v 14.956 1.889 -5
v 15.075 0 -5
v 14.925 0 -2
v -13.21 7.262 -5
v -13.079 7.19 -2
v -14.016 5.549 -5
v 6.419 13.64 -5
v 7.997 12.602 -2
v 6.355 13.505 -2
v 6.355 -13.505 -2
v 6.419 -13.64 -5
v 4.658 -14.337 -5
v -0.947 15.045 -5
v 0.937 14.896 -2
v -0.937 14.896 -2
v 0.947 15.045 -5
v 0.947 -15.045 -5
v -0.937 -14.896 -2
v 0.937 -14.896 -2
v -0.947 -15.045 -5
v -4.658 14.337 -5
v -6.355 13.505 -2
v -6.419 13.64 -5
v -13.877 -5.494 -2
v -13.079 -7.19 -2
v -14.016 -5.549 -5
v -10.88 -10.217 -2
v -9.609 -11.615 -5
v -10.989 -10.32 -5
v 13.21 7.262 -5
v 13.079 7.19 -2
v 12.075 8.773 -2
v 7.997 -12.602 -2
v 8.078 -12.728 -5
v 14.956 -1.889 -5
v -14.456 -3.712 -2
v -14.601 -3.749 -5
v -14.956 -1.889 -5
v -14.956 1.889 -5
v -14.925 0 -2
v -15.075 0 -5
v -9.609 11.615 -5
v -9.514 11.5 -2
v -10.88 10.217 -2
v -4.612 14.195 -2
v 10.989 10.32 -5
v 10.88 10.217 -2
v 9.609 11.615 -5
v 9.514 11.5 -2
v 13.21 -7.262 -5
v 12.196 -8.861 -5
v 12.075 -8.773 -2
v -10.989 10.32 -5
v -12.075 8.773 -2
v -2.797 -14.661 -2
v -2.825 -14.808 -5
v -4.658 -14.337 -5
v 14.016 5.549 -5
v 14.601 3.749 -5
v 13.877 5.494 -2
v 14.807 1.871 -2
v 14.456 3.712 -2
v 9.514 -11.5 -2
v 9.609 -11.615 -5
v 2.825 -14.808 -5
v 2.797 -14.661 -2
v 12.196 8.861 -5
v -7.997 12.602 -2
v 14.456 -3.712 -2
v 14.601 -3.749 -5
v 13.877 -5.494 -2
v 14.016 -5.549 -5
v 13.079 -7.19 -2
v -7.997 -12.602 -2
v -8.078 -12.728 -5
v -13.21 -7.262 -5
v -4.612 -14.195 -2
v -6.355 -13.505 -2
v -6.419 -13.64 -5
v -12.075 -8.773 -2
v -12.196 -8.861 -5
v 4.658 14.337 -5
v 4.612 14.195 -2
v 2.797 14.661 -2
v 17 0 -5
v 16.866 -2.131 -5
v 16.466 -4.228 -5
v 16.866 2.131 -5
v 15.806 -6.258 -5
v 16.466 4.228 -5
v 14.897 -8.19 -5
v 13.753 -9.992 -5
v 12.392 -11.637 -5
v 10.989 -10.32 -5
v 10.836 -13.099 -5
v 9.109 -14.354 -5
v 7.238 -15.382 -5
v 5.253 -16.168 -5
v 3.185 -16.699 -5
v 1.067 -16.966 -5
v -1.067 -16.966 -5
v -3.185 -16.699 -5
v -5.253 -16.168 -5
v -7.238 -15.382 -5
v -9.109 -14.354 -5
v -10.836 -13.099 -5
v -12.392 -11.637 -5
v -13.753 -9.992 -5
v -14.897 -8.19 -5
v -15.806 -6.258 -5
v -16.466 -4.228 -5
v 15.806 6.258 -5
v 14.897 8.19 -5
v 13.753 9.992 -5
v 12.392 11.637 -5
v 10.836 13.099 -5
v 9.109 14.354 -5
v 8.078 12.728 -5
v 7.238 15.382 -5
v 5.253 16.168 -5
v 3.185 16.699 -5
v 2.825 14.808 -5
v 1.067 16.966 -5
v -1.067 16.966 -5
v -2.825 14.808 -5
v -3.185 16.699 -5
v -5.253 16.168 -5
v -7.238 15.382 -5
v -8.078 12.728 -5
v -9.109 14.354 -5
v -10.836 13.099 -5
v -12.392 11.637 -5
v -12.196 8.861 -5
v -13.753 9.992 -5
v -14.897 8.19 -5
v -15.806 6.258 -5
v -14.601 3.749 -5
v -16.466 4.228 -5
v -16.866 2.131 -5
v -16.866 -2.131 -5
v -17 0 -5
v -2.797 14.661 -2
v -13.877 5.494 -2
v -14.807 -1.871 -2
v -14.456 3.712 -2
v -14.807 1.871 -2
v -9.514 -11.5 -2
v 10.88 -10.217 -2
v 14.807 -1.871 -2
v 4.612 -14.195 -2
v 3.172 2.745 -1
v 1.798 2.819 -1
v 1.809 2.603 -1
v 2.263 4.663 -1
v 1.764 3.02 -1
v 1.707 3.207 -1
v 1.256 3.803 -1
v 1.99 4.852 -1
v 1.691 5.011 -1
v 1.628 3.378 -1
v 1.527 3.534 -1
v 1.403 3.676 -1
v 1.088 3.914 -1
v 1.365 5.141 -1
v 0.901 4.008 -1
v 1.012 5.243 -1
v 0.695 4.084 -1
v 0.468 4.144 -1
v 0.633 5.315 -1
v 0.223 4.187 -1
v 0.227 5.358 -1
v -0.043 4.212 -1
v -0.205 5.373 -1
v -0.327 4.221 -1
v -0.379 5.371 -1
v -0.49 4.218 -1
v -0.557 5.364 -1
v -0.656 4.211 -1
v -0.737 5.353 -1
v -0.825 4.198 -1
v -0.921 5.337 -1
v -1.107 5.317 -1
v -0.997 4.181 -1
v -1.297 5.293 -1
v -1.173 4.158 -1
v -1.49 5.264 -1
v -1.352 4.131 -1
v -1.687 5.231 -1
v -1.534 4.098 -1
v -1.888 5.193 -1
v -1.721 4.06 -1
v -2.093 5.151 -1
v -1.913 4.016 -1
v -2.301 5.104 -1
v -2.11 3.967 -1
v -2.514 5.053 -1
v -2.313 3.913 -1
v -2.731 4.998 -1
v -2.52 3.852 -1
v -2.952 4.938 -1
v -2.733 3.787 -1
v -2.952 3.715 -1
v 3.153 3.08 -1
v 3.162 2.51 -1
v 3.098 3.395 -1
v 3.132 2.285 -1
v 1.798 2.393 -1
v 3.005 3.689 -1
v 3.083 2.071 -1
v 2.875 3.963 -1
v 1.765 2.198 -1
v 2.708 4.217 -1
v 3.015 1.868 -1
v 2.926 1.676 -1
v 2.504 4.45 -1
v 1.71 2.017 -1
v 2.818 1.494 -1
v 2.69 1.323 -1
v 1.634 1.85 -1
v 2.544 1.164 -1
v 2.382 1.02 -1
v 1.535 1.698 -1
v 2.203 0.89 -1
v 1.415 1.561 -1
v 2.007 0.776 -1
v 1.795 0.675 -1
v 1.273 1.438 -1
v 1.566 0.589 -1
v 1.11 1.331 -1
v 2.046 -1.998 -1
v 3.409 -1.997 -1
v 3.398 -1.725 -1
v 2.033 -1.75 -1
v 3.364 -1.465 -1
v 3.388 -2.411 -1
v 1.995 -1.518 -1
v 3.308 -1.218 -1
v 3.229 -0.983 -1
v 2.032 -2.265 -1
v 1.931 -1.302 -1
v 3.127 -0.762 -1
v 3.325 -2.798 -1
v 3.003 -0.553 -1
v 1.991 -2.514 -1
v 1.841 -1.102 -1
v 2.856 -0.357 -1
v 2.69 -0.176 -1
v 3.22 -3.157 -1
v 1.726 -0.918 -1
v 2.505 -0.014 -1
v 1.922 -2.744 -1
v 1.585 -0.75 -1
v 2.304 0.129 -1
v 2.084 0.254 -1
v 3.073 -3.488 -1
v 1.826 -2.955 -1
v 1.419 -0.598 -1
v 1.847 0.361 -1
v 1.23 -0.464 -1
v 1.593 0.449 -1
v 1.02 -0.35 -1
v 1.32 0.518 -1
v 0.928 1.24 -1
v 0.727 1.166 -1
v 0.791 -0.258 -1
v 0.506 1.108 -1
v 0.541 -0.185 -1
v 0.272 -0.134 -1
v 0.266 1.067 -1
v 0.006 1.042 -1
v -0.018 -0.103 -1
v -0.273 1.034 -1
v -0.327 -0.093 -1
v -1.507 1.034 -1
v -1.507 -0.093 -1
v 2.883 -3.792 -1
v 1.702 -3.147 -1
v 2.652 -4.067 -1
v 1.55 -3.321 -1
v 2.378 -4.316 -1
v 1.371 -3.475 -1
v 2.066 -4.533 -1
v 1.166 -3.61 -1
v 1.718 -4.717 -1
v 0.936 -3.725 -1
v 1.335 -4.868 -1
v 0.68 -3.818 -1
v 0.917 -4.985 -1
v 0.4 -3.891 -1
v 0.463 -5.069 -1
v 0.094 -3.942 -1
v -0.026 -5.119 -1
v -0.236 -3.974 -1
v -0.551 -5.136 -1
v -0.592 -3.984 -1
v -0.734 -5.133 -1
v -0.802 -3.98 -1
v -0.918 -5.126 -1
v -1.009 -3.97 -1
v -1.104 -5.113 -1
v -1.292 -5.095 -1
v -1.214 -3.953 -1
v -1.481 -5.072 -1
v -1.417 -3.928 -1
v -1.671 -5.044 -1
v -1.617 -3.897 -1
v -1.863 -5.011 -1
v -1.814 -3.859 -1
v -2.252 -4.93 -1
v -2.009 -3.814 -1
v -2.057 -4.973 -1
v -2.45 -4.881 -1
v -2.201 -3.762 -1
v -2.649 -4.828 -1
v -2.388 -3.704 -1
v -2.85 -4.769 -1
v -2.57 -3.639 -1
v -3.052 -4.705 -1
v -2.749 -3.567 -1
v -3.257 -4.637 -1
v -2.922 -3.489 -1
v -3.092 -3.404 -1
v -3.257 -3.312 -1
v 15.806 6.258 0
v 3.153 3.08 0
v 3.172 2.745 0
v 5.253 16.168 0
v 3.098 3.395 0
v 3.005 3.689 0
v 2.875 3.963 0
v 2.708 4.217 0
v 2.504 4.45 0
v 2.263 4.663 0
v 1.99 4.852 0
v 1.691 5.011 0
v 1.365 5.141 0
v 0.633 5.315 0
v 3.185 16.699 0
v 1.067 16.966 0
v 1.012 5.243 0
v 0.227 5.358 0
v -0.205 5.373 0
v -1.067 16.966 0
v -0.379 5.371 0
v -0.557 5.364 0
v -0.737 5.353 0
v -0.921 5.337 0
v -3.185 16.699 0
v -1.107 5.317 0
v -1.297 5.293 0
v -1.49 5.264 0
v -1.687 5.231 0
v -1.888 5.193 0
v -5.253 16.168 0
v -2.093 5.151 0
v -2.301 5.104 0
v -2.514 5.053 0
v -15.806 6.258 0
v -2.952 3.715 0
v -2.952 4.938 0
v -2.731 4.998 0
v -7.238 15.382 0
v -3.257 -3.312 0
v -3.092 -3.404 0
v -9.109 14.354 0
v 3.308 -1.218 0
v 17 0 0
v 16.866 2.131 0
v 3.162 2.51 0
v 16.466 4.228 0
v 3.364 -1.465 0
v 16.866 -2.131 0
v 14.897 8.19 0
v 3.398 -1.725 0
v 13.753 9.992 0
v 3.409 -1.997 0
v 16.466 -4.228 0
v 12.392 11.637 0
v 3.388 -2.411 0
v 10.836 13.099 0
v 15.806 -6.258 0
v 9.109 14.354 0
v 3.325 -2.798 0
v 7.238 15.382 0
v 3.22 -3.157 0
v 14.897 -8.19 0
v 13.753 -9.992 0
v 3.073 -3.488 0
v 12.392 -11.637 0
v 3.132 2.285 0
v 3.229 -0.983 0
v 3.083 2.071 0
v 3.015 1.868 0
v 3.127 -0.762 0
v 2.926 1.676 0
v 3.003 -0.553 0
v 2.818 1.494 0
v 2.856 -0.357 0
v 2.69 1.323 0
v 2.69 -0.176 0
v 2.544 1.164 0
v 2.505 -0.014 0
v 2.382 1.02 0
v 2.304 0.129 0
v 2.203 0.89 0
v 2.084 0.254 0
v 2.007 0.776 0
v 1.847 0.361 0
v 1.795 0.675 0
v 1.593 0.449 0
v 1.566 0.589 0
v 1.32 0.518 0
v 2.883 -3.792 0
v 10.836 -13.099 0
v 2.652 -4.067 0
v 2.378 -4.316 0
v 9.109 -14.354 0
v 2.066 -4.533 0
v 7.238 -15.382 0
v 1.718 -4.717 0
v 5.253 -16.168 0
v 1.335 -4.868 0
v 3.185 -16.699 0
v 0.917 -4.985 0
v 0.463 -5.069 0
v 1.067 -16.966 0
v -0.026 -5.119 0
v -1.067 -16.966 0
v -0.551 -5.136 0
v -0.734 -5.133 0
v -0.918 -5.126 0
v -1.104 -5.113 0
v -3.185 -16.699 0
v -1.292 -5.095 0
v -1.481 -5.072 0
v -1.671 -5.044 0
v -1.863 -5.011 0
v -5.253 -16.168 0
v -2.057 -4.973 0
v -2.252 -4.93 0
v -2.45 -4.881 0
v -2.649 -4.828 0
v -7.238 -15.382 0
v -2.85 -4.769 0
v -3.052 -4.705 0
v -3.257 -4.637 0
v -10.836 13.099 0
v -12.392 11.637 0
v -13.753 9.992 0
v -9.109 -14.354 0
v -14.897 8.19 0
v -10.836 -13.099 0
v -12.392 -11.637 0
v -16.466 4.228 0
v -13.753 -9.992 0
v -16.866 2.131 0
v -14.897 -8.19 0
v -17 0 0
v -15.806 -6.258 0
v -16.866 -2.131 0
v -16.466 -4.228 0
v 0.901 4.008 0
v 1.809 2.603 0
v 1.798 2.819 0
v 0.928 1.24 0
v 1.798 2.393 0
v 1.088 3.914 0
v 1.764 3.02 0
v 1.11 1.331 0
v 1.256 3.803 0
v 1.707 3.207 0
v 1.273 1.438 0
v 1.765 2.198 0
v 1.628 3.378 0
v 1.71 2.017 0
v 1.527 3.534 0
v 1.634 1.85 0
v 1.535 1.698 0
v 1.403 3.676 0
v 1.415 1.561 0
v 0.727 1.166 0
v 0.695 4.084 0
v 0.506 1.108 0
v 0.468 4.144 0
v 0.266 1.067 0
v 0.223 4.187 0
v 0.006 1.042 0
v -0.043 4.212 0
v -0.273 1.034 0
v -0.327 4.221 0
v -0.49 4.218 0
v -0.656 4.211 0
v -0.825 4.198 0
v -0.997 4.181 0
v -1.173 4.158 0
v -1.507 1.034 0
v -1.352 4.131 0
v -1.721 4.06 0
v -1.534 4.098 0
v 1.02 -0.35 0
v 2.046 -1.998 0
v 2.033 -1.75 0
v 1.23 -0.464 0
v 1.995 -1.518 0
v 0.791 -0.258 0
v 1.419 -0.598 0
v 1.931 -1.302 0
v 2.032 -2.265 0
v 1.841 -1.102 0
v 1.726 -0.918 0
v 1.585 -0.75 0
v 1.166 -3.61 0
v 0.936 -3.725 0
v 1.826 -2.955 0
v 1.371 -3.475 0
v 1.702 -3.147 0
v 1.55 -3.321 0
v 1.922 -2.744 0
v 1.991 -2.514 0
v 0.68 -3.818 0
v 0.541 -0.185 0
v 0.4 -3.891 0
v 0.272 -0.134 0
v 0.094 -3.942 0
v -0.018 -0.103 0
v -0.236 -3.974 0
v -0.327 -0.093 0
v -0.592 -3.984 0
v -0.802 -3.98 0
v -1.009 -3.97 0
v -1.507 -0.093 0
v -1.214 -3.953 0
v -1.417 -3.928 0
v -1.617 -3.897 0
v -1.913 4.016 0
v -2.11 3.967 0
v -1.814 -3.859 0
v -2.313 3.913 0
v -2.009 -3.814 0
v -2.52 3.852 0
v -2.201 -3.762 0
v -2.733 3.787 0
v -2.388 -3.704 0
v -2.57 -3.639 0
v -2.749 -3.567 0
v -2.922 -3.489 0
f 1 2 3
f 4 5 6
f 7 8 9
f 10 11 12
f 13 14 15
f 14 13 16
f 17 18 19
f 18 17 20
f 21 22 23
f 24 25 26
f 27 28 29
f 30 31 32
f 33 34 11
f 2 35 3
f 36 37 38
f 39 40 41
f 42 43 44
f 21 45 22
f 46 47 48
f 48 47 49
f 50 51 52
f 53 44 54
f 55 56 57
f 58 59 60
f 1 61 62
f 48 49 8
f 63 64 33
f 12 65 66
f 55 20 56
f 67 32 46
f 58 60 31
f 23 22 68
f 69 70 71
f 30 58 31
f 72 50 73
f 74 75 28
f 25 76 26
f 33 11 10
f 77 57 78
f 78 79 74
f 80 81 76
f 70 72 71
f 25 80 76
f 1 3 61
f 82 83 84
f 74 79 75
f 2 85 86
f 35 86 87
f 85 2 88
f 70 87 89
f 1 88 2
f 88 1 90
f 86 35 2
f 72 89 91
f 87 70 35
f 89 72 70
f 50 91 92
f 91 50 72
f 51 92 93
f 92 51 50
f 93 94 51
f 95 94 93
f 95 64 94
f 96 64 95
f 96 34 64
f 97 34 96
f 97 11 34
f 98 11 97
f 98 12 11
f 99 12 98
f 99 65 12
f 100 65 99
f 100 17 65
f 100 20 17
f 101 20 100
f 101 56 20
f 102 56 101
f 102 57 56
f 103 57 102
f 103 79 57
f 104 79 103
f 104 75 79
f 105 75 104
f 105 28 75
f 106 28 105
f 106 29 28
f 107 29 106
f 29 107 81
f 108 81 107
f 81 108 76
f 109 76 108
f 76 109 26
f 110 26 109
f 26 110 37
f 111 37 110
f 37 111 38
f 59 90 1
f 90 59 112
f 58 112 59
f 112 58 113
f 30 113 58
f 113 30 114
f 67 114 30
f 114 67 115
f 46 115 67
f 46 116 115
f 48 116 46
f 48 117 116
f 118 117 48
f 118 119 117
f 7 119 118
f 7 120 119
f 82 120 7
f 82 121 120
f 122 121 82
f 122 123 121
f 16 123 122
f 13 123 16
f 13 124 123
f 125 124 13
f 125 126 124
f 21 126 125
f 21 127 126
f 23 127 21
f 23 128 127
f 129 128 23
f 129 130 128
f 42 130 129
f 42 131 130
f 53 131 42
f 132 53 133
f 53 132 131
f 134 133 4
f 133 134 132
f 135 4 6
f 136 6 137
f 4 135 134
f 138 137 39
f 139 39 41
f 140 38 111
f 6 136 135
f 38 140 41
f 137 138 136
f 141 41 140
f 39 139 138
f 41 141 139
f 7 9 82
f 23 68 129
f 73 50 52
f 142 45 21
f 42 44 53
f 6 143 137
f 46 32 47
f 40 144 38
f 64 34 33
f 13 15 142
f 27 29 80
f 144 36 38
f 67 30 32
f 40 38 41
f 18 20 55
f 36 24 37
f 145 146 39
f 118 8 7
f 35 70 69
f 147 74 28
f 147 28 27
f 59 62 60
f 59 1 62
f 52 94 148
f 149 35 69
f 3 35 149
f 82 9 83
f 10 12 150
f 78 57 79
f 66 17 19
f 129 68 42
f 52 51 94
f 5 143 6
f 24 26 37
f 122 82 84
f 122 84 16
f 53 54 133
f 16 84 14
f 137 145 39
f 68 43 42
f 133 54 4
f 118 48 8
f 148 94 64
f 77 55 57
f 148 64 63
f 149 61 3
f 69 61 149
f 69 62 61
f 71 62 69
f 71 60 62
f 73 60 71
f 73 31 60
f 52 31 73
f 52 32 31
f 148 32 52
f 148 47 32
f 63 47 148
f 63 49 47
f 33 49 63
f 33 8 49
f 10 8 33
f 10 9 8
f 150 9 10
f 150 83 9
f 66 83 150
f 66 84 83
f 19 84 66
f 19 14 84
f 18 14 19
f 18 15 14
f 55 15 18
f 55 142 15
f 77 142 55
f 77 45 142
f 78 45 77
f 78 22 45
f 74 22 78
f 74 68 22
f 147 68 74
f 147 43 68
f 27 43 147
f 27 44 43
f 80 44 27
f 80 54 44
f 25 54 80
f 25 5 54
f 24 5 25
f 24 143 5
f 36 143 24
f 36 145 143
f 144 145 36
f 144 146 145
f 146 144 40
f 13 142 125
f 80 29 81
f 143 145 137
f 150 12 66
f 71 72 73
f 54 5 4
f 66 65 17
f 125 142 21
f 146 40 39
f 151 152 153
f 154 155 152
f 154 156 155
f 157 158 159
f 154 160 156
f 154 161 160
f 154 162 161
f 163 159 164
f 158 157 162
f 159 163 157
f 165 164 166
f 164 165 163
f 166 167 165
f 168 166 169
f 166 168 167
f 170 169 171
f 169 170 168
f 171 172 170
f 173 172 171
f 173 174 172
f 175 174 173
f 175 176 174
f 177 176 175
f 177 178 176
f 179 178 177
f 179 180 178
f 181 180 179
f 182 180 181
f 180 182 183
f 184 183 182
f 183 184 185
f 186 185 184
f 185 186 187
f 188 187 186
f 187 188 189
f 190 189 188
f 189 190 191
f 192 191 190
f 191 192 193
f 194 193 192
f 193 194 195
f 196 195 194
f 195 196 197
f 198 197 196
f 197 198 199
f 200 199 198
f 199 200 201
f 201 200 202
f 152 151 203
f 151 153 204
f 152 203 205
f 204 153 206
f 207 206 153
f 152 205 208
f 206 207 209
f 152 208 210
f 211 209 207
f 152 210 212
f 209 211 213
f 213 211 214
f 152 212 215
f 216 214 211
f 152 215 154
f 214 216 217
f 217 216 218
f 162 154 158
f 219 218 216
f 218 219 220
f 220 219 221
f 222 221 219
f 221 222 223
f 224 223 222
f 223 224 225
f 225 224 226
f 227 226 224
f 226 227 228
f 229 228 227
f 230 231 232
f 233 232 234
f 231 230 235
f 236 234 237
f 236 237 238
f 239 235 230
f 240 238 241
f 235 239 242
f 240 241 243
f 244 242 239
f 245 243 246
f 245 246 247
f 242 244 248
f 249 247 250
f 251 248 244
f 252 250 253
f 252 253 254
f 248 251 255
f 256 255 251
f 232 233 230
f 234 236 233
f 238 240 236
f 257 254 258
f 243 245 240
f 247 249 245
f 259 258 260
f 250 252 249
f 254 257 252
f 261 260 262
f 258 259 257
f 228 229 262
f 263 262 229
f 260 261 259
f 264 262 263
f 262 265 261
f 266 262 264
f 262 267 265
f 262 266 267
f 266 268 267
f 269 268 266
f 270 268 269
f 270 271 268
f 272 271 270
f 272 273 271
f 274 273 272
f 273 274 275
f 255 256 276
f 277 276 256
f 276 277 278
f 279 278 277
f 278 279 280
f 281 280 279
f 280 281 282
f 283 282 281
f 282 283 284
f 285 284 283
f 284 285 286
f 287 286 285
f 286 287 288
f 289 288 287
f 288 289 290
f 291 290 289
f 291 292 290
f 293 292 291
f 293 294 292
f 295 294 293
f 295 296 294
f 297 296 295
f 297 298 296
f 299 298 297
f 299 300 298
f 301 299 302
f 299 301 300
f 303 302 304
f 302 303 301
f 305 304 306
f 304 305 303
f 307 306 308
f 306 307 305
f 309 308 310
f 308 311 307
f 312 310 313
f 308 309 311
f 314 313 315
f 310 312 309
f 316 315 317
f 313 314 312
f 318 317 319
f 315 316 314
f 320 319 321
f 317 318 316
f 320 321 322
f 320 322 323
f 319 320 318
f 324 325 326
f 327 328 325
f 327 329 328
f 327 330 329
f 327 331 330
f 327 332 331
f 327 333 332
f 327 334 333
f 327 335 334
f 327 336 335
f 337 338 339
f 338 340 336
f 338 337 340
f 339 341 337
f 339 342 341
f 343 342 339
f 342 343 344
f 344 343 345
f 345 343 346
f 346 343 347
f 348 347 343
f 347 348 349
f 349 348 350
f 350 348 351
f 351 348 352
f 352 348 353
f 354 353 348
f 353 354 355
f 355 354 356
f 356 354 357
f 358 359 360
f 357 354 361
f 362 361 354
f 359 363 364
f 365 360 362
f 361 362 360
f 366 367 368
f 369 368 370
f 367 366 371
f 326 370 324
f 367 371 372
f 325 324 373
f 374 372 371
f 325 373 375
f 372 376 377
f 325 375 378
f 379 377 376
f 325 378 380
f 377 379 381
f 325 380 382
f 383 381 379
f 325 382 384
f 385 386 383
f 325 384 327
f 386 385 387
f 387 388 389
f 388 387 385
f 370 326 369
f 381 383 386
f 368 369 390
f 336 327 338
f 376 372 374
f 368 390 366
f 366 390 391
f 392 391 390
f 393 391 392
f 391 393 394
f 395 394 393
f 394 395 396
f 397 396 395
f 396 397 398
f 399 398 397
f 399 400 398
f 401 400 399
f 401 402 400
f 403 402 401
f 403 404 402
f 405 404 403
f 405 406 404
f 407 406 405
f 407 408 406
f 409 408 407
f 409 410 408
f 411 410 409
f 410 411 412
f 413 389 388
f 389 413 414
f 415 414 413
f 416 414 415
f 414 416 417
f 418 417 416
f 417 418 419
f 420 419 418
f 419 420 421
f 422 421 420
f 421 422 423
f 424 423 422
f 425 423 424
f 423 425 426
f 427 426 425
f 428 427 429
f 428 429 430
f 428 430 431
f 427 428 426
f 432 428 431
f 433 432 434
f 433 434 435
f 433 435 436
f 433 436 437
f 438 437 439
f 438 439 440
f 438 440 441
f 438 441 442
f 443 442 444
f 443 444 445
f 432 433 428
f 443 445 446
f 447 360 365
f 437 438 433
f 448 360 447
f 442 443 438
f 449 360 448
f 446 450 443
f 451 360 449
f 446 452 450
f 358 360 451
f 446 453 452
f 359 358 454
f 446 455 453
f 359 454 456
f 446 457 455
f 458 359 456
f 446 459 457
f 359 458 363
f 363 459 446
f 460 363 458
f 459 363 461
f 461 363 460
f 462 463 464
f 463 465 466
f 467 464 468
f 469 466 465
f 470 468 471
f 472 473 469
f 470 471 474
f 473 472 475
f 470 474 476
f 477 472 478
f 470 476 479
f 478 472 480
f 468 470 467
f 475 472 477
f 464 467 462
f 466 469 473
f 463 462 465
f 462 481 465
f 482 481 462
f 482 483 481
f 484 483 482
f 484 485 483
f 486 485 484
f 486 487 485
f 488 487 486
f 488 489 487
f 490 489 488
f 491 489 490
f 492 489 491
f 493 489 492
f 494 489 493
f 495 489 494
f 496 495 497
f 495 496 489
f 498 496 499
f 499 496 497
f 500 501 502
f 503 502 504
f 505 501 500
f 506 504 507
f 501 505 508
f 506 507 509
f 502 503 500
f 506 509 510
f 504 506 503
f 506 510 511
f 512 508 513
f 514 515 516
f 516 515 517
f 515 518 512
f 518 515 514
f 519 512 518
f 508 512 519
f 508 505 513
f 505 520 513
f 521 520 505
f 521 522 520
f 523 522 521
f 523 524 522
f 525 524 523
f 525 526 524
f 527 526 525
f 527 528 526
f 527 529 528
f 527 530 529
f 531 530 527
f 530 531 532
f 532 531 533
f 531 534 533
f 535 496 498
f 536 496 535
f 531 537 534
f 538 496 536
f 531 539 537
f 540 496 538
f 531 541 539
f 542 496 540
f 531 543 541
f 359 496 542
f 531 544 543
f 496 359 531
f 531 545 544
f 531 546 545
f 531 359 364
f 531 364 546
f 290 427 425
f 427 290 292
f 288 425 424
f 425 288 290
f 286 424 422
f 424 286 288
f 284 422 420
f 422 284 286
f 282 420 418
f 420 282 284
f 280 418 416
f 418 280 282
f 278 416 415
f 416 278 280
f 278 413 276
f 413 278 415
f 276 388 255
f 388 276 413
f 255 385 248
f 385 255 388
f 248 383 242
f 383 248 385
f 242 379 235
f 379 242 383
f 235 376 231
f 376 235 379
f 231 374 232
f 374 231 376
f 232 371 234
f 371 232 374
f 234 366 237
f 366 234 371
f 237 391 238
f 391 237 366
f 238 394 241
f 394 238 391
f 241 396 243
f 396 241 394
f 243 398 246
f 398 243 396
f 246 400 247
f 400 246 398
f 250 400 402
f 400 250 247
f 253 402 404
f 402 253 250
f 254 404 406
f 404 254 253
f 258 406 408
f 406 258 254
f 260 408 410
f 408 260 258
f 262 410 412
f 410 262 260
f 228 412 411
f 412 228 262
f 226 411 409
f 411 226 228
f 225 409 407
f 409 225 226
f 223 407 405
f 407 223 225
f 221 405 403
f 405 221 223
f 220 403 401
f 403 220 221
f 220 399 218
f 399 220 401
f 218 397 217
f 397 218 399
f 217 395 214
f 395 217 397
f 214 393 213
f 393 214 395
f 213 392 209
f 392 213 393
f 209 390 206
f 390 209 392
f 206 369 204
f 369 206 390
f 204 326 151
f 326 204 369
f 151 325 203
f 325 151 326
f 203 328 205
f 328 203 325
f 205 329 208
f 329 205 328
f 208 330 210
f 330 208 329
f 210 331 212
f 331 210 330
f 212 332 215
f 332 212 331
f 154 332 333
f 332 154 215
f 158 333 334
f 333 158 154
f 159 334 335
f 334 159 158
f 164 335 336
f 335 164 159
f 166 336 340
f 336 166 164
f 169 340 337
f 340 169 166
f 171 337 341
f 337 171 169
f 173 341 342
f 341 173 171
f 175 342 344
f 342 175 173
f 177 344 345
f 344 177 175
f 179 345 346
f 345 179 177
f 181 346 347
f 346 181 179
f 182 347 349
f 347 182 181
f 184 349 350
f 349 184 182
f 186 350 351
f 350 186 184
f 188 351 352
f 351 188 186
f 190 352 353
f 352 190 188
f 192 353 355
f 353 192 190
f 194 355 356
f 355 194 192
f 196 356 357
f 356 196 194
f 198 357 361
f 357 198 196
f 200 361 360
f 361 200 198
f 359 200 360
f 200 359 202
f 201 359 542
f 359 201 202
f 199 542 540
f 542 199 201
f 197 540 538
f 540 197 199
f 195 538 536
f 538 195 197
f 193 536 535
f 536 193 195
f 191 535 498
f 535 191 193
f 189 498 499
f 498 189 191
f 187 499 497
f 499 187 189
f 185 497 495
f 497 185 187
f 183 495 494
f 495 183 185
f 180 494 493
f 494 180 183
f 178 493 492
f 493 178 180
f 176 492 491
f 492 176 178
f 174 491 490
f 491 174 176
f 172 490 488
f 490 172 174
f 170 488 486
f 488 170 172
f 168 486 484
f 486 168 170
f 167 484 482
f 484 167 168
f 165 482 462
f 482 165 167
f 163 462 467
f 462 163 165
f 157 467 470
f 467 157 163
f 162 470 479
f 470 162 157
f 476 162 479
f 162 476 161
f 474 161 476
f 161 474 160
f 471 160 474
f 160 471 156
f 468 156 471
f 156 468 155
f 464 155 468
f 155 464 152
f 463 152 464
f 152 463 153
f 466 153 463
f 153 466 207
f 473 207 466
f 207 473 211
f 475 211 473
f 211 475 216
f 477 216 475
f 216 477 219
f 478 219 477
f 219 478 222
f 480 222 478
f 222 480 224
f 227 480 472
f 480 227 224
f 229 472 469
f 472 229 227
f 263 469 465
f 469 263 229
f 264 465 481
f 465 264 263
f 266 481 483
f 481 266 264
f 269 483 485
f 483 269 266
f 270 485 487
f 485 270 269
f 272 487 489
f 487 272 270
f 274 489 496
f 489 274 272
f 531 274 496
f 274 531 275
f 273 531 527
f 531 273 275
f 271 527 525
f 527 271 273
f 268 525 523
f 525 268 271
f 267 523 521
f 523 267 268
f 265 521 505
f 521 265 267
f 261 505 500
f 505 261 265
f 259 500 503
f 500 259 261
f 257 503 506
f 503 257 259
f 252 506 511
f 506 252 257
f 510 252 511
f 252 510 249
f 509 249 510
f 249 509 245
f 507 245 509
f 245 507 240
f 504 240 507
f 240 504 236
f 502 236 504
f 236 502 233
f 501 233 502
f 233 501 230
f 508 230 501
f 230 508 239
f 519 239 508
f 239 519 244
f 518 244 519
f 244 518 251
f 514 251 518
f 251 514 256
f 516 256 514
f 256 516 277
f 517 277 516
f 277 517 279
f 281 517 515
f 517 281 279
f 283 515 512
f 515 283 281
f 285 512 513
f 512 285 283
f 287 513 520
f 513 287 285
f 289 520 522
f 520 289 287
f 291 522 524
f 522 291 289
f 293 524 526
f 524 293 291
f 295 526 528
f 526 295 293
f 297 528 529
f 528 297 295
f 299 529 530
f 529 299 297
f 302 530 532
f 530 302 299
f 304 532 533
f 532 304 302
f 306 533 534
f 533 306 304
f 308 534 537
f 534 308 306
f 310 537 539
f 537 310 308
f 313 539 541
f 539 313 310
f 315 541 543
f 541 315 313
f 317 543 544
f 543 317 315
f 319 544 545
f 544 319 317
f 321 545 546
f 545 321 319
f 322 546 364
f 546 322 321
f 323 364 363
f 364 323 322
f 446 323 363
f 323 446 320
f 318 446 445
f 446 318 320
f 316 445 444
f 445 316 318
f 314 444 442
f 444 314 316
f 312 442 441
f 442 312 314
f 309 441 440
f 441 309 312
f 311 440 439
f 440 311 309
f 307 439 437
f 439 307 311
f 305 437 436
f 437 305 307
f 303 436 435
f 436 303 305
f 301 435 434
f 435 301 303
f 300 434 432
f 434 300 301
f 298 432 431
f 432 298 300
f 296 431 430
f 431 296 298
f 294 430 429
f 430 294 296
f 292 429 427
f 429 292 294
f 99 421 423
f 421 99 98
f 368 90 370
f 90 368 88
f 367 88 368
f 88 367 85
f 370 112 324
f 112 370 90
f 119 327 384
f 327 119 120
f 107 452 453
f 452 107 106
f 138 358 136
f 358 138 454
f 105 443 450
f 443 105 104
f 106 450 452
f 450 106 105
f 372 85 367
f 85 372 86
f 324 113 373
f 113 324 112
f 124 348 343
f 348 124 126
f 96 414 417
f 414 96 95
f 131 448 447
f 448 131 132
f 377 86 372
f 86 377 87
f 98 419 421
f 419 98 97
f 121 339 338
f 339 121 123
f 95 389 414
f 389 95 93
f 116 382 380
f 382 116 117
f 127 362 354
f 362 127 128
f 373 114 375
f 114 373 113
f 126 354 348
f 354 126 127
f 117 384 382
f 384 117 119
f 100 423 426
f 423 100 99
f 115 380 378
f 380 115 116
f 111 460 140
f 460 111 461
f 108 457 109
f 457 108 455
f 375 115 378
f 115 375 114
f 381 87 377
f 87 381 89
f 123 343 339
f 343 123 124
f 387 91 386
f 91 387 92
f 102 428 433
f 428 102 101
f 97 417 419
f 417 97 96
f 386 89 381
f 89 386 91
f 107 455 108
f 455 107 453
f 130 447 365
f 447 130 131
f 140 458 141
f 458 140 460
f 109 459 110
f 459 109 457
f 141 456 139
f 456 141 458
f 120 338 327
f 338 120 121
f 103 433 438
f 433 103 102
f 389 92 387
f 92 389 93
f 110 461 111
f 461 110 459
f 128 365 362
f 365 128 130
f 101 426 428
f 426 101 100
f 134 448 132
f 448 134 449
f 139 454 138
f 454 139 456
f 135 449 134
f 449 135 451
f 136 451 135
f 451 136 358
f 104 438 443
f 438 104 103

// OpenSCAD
$fn = 50;


difference() {
	union() {
		translate(v = [0, 0, -5.0000000000]) {
			cylinder(h = 5, r = 17.0000000000);
		}
	}
	union() {
		#translate(v = [0, 0, -5.0000000000]) {
			cylinder(h = 3, r1 = 15.0750000000, r2 = 14.9250000000);
		}
		translate(v = [0, 0, -1]) {
			linear_extrude(height = 1) {
				text(font = "Impact", halign = "center", size = 10, text = "3", valign = "center");
			}
		}
	}
}
